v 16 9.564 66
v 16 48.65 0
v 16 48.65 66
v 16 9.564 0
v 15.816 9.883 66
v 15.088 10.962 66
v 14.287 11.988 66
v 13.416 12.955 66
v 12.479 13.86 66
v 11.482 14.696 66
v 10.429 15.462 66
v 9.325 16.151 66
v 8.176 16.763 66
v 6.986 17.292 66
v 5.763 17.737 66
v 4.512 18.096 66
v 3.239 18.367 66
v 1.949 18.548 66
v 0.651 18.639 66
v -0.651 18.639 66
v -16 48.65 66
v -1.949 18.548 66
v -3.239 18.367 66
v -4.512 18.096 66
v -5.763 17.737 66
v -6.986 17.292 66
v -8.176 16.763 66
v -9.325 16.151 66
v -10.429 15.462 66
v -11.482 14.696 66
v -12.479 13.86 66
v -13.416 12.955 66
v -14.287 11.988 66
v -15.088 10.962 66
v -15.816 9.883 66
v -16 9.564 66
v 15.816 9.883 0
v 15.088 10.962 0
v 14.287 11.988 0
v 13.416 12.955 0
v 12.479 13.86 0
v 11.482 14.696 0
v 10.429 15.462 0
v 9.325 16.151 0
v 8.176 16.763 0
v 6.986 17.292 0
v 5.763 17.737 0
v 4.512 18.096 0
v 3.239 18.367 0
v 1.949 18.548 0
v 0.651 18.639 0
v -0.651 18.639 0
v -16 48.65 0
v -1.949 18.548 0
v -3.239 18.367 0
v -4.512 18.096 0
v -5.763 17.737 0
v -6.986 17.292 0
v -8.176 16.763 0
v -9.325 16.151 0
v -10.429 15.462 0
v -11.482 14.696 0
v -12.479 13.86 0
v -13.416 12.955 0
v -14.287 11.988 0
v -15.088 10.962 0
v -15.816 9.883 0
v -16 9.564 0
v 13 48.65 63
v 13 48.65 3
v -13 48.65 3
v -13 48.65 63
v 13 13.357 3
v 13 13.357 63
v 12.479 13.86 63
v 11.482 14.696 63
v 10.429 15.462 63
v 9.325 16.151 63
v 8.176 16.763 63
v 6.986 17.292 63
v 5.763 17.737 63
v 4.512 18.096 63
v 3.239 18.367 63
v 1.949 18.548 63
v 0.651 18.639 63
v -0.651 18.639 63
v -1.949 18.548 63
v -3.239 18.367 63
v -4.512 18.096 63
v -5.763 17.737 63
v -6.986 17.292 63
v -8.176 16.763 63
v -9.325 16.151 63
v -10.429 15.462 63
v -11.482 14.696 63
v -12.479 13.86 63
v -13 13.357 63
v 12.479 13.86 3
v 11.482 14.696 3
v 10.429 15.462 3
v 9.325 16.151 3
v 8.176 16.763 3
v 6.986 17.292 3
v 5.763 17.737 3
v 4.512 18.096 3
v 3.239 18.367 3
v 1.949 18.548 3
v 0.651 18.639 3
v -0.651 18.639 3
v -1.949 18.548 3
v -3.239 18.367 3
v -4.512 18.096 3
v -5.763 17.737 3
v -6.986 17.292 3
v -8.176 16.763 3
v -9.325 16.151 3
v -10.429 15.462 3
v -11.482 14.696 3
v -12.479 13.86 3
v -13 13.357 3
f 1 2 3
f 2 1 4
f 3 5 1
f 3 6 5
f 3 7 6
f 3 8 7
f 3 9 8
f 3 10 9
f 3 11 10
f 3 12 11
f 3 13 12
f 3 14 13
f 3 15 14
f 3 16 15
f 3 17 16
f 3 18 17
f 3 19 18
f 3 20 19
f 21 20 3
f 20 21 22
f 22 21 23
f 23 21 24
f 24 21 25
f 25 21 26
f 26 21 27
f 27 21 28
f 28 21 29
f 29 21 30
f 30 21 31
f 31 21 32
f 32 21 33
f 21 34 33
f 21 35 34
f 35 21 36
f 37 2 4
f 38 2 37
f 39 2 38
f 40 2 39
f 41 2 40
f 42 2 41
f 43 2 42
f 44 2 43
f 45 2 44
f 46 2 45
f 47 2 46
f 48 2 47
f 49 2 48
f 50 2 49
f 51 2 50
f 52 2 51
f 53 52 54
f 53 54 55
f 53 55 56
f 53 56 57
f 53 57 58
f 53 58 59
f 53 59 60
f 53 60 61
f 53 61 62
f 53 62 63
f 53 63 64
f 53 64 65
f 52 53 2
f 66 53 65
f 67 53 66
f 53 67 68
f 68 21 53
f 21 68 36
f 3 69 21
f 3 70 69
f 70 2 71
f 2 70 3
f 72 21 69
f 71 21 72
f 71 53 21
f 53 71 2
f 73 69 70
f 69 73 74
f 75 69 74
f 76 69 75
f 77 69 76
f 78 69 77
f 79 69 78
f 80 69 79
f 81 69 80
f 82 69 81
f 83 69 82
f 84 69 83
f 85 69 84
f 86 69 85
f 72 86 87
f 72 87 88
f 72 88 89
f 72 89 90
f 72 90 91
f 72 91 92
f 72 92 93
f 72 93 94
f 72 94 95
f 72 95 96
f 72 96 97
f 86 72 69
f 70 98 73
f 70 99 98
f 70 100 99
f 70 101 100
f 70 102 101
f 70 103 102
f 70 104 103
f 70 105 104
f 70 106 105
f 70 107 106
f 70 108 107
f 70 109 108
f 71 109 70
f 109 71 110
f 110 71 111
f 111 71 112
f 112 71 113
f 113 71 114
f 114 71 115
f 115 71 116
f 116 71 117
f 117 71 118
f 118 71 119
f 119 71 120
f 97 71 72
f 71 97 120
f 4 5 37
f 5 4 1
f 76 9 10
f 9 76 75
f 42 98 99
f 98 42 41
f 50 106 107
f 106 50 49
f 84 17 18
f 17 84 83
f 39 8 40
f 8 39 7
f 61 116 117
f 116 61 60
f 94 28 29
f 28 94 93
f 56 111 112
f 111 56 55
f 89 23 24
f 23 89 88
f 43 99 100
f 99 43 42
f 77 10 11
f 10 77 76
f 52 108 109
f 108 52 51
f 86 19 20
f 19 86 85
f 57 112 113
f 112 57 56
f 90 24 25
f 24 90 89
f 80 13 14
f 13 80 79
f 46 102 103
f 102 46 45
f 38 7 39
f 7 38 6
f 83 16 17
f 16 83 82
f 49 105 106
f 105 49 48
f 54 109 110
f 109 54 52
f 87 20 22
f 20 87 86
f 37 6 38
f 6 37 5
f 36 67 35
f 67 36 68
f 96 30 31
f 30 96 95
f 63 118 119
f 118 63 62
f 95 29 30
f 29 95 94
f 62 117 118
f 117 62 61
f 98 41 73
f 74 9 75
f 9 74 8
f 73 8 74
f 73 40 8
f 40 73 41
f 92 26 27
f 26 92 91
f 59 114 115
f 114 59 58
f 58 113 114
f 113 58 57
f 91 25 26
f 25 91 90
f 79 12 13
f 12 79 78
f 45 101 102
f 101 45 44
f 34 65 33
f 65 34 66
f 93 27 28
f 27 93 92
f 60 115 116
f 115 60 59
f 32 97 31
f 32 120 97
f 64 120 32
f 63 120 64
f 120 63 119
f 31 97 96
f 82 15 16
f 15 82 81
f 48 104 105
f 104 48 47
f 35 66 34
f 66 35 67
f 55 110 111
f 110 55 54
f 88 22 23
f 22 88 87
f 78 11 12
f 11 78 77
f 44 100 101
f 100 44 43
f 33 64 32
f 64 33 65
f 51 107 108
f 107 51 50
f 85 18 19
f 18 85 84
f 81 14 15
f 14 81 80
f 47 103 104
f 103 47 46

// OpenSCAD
/* Test aluminum
D_TUBE = 31.8;
*/

D_TUBE = 37.3;

R_TUBE = D_TUBE / 2;
L = 60;
W = 26;
H = 30;
T = 3;

$fn=90;

difference() {
    translate([-W/2-T, 0, 0]) {
        cube(size=[W + T*2, H + R_TUBE, L + T*2]);
    }
    translate([-W/2, 0, T]) {
        cube(size=[W, H + R_TUBE + 20, L]);
    }
    cylinder(h=L + T*2, r=D_TUBE/2);
}
